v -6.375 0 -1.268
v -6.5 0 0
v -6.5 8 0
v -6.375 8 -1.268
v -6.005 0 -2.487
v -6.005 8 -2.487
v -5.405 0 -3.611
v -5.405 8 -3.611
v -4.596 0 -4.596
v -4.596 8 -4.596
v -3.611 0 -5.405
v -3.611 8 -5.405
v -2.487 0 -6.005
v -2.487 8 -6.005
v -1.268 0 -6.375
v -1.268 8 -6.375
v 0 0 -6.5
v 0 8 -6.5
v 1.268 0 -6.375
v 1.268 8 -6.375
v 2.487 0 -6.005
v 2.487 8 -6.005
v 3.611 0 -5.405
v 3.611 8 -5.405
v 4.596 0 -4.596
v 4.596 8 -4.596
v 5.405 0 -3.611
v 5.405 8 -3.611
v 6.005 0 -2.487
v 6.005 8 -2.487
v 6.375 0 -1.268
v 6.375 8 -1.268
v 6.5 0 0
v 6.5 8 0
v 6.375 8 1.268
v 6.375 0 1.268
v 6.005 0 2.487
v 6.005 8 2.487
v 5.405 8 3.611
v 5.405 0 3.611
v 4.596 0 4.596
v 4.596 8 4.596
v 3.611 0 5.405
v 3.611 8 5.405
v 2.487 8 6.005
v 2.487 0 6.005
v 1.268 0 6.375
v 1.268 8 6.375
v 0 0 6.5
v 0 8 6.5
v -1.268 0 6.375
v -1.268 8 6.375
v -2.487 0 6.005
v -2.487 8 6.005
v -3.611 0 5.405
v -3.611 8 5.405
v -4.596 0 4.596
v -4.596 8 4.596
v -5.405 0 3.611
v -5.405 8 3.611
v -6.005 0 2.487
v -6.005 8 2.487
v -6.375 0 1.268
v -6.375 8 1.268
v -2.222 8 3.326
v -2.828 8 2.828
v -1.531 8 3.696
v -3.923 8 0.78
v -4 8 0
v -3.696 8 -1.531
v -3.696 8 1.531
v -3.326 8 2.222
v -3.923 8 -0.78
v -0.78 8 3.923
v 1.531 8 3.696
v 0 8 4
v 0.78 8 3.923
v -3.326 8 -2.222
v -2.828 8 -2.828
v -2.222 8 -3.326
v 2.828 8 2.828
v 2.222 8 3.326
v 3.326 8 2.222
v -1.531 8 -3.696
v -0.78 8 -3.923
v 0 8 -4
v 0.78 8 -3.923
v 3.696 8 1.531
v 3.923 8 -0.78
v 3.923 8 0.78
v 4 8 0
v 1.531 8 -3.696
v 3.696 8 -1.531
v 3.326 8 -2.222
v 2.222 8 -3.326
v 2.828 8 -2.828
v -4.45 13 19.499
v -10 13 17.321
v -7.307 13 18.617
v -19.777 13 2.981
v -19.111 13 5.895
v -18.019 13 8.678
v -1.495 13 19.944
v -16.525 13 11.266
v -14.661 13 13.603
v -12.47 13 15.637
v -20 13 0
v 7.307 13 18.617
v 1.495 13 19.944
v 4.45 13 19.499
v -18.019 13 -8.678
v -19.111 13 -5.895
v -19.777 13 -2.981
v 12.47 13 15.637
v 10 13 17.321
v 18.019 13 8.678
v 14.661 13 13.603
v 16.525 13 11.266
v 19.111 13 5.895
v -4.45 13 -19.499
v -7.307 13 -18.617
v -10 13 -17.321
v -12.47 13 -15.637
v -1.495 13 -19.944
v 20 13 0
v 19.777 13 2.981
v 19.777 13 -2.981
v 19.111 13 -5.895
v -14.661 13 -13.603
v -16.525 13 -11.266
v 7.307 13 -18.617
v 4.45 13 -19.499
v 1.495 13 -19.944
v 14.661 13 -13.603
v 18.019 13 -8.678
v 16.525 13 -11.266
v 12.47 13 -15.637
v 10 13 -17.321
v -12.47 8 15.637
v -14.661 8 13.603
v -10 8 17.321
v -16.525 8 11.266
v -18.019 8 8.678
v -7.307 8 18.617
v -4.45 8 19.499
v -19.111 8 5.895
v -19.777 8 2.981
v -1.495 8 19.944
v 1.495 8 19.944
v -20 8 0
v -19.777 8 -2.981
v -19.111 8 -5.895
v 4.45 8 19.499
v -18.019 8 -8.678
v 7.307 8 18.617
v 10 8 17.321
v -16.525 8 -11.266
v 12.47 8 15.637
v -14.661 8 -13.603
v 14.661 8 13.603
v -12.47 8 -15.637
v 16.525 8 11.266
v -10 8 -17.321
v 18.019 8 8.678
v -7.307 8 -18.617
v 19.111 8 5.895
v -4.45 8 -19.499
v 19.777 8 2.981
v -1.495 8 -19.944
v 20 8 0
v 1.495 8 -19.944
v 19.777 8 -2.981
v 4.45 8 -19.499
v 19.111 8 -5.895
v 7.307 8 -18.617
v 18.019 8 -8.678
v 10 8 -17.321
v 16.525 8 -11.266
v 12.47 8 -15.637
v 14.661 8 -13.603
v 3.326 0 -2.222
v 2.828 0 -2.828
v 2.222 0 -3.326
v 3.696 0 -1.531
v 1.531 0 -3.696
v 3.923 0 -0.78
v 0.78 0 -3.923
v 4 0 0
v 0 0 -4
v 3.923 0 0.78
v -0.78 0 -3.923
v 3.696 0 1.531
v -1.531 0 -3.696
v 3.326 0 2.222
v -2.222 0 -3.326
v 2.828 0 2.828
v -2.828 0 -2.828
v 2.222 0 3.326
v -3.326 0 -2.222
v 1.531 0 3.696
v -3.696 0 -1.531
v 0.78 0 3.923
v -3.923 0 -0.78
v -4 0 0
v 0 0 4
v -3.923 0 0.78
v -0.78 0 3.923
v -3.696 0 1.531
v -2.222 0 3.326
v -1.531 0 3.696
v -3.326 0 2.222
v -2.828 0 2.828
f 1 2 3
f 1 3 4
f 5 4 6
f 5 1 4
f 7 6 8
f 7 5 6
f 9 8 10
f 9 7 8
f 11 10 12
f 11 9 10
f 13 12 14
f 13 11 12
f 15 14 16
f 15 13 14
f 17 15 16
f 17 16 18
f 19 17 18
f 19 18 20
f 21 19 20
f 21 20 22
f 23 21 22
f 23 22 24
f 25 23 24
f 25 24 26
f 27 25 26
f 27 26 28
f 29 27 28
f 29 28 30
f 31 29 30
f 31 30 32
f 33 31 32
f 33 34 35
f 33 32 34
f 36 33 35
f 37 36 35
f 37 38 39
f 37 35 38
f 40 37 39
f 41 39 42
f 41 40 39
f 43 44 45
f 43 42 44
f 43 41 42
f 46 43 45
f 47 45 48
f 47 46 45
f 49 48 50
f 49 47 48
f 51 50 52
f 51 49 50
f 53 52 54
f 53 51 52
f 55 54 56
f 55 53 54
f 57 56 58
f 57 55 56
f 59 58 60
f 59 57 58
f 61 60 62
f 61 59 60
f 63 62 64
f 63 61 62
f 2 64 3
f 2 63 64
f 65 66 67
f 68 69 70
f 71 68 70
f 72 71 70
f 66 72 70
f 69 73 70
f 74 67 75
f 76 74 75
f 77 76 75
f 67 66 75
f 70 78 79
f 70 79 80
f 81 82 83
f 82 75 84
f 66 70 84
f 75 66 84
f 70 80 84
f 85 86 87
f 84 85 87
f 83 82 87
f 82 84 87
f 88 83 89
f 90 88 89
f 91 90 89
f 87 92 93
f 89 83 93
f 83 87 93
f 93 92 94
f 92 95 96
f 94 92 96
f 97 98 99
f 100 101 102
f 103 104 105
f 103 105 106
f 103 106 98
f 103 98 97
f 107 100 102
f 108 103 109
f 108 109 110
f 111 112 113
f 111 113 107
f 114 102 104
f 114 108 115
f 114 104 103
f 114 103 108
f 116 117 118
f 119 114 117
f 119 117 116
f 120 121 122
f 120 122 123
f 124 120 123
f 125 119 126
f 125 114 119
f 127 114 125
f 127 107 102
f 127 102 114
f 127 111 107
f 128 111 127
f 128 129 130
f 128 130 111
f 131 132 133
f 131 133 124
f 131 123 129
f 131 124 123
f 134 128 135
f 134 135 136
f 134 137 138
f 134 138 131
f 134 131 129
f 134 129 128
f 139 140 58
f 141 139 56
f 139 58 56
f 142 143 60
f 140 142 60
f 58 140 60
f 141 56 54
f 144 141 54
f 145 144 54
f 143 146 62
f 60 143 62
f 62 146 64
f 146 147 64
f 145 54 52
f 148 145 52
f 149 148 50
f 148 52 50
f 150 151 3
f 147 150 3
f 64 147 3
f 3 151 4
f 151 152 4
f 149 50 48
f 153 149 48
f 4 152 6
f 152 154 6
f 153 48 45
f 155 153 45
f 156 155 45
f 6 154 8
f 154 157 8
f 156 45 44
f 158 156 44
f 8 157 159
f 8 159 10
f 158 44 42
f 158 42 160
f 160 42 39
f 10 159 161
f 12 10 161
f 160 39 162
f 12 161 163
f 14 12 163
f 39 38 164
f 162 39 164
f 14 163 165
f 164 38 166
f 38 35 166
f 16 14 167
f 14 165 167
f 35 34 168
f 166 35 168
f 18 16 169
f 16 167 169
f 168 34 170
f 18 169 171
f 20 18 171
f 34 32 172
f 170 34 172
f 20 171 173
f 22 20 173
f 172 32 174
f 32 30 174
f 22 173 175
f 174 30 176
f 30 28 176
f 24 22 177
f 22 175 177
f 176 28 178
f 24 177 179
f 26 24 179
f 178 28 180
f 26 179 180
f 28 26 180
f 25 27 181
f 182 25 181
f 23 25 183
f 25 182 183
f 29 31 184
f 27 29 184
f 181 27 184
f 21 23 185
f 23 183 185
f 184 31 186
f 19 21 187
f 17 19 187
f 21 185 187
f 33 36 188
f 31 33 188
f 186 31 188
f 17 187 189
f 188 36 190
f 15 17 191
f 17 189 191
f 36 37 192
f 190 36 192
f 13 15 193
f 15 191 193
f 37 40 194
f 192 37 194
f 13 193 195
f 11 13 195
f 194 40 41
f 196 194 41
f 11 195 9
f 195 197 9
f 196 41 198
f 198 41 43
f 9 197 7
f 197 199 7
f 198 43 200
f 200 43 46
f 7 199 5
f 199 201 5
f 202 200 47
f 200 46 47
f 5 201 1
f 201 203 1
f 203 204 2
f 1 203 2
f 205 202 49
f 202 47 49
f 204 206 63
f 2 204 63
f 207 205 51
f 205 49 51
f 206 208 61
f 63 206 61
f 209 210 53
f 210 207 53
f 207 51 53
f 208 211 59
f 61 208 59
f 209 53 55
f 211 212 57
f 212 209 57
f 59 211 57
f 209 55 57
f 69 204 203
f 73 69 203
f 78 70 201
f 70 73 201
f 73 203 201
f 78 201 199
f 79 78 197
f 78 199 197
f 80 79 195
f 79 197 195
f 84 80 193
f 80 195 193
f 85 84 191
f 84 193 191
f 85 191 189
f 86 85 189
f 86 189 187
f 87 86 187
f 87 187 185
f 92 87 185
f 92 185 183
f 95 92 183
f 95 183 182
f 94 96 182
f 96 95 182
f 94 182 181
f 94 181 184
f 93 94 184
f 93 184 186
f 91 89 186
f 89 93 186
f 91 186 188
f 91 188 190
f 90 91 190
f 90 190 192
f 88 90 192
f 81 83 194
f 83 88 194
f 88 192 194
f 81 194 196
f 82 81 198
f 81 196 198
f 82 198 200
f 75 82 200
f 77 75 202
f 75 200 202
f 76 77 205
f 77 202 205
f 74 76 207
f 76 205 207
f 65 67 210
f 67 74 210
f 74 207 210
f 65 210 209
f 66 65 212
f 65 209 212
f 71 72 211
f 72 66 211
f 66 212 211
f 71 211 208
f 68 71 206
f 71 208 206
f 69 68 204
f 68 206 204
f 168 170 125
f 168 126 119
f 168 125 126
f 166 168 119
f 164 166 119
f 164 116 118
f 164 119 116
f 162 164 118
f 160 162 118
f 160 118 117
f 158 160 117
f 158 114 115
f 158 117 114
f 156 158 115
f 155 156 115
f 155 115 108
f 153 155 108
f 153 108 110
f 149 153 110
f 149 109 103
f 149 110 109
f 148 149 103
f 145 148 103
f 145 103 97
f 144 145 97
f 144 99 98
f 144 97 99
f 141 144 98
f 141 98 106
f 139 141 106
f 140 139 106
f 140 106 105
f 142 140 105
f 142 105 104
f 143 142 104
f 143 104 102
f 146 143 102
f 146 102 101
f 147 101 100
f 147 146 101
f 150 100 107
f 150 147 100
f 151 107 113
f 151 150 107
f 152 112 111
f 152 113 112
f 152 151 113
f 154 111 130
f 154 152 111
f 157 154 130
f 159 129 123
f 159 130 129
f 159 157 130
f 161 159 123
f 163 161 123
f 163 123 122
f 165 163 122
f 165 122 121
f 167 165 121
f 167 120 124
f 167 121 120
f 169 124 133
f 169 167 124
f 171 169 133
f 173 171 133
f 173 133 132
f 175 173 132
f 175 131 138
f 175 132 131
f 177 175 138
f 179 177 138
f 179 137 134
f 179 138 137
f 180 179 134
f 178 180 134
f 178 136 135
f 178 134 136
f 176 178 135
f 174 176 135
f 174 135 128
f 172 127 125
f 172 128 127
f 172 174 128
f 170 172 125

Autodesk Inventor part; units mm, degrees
ref_plane "YZ Plane" through (0, 0, 0) normal (1, 0, 0) x (0, 1, 0)
ref_plane "XZ Plane" through (0, 0, 0) normal (0, 1, 0) x (-1, 0, 0)
ref_plane "XY Plane" through (0, 0, 0) normal (0, 0, 1) x (1, 0, 0)
sketch "Sketch1" plane through (0, 0, 0) normal (0, 1, 0) x (-1, 0, 0)
  circle A0 centre (0, 0) radius 4
  circle A1 centre (0, 0) radius 6.5
  dimension "d0" = 8
  dimension "d1" = 13
extrude "Extrusion1" add sketch "Sketch1" along normal blind 8
sketch "Sketch2" plane through (0, 8, 0) normal (0, 1, 0) x (1, 0, 0)
  circle A0 centre (0, 0) radius 20
  dimension "d4" = 40
extrude "Extrusion2" add sketch "Sketch2" along normal blind 5
properties part number "Servo_horn_big"
